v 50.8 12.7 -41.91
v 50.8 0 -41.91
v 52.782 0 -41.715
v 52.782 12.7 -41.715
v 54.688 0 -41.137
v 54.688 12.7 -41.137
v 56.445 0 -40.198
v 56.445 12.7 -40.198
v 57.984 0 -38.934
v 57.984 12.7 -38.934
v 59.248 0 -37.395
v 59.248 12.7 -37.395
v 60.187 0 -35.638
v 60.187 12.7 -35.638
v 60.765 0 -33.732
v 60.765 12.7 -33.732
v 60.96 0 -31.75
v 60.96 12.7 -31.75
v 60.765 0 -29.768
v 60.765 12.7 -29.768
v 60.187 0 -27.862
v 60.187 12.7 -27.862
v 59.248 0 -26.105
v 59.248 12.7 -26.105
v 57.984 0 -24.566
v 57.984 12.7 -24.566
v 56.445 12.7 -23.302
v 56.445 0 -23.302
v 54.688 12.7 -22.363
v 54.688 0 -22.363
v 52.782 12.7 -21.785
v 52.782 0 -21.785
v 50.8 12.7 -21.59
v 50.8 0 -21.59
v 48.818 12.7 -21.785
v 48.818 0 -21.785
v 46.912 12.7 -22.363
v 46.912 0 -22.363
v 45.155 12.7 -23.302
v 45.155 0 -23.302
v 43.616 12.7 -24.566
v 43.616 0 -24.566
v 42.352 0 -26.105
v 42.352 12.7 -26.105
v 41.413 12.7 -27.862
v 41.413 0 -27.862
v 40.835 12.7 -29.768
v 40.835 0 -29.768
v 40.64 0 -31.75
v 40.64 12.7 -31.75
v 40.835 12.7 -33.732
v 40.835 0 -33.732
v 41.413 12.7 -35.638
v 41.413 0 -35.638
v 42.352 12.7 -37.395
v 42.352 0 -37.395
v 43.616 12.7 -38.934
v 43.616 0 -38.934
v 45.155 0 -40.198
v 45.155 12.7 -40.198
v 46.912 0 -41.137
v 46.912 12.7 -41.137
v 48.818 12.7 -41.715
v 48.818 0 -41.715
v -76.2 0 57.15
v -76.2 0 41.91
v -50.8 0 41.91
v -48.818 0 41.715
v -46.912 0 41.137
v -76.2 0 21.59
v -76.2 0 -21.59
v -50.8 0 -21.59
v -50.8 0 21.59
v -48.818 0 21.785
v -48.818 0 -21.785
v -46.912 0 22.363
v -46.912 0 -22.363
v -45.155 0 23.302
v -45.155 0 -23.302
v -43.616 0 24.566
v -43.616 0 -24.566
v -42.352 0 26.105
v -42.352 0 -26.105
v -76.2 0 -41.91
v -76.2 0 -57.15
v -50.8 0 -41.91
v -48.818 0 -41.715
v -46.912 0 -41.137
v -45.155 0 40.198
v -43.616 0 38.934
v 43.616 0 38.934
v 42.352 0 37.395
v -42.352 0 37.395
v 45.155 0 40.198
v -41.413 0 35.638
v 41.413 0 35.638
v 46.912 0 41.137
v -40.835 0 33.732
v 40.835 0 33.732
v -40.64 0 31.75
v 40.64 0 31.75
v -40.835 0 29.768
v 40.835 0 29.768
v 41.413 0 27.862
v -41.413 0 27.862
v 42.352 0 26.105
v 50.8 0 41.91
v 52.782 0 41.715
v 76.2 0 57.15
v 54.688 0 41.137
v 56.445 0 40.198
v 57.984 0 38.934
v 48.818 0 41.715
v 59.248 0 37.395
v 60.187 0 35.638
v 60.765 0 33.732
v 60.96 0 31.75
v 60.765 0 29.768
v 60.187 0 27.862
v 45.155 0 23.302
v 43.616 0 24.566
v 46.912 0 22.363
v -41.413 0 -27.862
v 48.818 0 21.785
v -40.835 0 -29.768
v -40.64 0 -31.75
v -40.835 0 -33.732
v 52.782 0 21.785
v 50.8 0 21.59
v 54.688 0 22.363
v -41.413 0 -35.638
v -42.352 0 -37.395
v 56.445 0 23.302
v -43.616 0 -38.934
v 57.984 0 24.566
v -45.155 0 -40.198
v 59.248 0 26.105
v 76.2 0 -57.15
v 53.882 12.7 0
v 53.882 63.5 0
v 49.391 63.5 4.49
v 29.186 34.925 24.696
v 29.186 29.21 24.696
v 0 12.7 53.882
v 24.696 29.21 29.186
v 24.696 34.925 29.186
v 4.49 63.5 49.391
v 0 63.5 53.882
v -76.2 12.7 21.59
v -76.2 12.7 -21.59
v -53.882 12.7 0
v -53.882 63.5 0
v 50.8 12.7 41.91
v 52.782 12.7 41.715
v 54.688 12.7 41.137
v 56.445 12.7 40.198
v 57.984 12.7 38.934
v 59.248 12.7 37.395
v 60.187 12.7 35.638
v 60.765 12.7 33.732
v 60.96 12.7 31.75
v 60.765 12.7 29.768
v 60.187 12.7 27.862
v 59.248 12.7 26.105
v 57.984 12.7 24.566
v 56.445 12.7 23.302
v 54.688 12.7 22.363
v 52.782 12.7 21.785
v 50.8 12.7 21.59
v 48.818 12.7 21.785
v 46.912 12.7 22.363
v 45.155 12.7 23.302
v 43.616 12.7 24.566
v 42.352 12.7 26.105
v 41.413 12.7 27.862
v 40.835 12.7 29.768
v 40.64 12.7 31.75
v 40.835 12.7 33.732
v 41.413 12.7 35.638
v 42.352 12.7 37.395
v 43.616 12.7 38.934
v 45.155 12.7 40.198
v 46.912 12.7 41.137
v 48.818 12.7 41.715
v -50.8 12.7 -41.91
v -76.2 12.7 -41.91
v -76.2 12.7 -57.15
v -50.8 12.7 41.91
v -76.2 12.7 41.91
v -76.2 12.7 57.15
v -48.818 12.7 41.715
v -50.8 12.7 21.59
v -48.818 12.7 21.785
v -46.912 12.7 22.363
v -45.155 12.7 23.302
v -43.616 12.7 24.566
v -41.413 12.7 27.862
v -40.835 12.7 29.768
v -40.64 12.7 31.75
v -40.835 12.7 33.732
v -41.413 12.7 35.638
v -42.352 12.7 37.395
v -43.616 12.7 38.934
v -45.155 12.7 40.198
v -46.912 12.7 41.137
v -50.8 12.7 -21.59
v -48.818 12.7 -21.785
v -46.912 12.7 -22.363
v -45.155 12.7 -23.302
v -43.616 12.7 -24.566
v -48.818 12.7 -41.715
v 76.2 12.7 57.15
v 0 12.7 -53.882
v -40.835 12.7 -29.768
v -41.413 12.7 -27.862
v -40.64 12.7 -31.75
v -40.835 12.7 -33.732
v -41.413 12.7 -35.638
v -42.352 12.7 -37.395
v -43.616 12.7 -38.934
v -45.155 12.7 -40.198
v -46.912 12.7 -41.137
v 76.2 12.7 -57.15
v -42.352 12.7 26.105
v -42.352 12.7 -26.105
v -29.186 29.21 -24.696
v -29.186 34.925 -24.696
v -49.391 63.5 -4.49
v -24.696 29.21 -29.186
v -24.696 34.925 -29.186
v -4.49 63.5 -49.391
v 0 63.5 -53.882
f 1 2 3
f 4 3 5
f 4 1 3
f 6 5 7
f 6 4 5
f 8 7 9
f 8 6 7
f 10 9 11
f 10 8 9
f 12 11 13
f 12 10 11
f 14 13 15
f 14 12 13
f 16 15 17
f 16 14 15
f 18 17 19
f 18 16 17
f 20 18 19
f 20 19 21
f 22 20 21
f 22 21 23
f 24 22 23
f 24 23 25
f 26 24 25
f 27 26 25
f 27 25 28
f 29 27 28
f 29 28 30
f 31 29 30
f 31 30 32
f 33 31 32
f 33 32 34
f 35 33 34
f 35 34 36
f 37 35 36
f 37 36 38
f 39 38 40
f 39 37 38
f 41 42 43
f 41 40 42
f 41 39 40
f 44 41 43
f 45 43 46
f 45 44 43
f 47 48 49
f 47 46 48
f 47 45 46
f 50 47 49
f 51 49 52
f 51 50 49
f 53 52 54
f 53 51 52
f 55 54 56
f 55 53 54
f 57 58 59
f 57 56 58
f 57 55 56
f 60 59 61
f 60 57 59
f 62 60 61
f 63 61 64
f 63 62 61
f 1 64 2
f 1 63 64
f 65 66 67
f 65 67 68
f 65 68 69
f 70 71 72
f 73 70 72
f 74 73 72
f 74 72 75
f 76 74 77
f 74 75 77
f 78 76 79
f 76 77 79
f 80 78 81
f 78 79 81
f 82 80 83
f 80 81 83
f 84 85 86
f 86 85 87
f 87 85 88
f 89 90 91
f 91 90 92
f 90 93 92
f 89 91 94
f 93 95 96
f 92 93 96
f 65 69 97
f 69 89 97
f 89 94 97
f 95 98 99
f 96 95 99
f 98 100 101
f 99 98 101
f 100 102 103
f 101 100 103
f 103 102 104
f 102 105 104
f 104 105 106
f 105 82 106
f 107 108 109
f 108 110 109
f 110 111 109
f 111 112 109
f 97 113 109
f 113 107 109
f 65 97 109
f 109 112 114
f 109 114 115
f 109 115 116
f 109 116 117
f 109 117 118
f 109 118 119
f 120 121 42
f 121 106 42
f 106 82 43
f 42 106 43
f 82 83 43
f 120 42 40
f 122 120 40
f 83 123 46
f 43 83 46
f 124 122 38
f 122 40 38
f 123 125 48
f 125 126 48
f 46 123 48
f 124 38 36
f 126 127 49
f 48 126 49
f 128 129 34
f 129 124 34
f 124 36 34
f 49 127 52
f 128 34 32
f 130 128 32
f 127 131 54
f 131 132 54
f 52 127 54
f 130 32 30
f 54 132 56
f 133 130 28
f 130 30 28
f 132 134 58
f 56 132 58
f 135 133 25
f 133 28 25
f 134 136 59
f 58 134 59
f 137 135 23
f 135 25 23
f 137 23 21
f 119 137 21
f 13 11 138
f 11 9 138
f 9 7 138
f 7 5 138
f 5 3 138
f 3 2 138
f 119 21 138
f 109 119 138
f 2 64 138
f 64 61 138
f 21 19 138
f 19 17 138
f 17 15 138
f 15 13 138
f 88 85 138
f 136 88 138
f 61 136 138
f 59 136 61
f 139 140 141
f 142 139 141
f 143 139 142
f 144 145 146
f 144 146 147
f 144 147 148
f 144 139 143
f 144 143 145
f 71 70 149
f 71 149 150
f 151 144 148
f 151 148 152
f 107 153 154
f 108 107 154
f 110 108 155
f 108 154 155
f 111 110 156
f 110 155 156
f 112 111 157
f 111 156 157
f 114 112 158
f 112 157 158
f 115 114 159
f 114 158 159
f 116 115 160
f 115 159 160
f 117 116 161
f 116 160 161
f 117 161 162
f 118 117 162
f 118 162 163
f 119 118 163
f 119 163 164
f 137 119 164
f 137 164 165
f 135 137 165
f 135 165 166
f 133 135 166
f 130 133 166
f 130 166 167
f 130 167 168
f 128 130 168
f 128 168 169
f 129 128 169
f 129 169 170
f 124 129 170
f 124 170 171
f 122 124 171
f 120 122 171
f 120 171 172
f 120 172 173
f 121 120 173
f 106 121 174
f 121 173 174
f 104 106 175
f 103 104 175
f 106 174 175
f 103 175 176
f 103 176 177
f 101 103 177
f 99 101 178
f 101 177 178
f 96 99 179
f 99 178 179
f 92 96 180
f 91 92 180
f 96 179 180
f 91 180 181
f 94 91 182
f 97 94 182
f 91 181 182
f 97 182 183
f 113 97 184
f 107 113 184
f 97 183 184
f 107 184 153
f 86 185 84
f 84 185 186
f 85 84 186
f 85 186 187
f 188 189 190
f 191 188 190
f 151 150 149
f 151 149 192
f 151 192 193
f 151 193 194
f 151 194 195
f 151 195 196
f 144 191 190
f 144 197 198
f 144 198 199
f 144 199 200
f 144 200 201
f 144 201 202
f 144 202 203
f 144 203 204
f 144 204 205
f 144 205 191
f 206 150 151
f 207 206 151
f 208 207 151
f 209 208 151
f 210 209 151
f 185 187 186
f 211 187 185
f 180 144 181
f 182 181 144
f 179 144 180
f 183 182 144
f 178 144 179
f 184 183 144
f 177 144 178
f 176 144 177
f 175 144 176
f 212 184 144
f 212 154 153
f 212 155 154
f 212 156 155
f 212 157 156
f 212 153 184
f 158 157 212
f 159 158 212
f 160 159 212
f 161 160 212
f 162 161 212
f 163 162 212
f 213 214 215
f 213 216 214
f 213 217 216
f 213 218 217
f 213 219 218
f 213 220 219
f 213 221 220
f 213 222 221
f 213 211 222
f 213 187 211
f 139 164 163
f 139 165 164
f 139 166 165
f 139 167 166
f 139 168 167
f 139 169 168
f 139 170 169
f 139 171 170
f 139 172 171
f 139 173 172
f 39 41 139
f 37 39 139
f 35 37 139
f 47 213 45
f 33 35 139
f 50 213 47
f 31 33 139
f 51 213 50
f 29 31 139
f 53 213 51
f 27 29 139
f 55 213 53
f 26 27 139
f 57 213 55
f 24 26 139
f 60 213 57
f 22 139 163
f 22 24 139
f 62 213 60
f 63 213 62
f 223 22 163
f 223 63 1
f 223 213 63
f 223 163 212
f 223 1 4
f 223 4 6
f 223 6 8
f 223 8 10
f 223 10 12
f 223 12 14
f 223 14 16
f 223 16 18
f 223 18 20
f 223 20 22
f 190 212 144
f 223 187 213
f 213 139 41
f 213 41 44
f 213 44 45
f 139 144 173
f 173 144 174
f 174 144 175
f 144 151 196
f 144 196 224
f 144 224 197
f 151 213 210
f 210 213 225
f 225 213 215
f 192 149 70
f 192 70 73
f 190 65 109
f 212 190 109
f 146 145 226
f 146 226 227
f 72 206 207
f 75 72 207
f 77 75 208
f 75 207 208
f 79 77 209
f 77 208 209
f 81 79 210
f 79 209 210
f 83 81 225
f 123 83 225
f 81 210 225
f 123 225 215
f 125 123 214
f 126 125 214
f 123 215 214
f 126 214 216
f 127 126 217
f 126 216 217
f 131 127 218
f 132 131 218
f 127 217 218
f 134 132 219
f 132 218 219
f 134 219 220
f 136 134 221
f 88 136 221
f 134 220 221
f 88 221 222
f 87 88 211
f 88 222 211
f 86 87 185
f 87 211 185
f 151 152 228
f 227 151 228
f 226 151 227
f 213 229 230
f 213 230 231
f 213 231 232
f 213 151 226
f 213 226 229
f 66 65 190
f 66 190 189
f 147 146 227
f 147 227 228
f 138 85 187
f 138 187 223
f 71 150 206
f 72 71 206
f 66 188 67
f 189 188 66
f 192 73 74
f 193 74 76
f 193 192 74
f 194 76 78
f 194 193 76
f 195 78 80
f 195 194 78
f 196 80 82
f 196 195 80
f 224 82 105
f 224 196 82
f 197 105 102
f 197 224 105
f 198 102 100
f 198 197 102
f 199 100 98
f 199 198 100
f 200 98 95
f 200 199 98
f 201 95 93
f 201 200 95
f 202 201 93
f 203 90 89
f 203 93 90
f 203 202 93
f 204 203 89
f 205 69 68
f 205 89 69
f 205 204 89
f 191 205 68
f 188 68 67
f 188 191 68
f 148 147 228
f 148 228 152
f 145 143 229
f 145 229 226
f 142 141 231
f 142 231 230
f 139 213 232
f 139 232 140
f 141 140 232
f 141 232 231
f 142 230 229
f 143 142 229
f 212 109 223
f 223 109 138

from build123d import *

# Parameters (mm, degrees)
CROQUIS1_W              = 152.4
CROQUIS1_H              = 114.3
SALIENTE_EXTRUIR1_DEPTH = 12.7
CROQUIS3_R              = 10.16
CORTAR_EXTRUIR1_DEPTH   = 97.092936785
SALIENTE_EXTRUIR2_DEPTH = 50.8
CORTAR_EXTRUIR2_DEPTH   = 148.45007773


with BuildPart() as part:
    # Croquis1 → Saliente-Extruir1 (new body)
    with BuildSketch(Plane(origin=(0, 0, 0), x_dir=(1, 0, 0), z_dir=(0, 1, 0))):
        Rectangle(CROQUIS1_W, CROQUIS1_H)
    extrude(amount=SALIENTE_EXTRUIR1_DEPTH)

    # Croquis3 → Cortar-Extruir1 (cut, through all)
    with BuildSketch(Plane(origin=(0, 12.7, 0), x_dir=(1, 0, 0), z_dir=(0, 1, 0))):
        with Locations(Location((50.8, -31.75, 0), (0, 0, 270))):
            Circle(CROQUIS3_R)
        with BuildLine():
            Line((-76.2, -21.59), (-50.8, -21.59))
            ThreePointArc((-50.8, -21.59), (-40.64, -31.75), (-50.8, -41.91))
            Line((-50.8, -41.91), (-76.2, -41.91))
            Line((-76.2, -41.91), (-76.2, -21.59))
        make_face()
    cortar_extruir1 = extrude(amount=-CORTAR_EXTRUIR1_DEPTH, mode=Mode.SUBTRACT)

    # Simetría1: Cortar-Extruir1 across plane
    add(cortar_extruir1.mirror(Plane.XY), mode=Mode.SUBTRACT)

    # Croquis4 → Saliente-Extruir2 (add)
    with BuildSketch(Plane(origin=(0, 12.7, 0), x_dir=(1, 0, 0), z_dir=(0, 1, 0))):
        Polygon((53.881536726, 0), (0, -53.881536726), (-53.881536726, 0), (0, 53.881536726), align=None)
    extrude(amount=SALIENTE_EXTRUIR2_DEPTH)

    # Croquis5 → Cortar-Extruir2 (cut, through all)
    with BuildSketch(Plane(origin=(26.940768363, 0, 26.940768363), x_dir=(0.7071067811865464, 0, -0.7071067811865488), z_dir=(0.7071067811865488, 0, 0.7071067811865464))):
        Polygon((-31.75, 63.5), (31.75, 63.5), (3.175, 34.925), (3.175, 29.21), (-3.175, 29.21), (-3.175, 34.925), align=None)
    extrude(amount=-CORTAR_EXTRUIR2_DEPTH, mode=Mode.SUBTRACT)


solid = part.part
